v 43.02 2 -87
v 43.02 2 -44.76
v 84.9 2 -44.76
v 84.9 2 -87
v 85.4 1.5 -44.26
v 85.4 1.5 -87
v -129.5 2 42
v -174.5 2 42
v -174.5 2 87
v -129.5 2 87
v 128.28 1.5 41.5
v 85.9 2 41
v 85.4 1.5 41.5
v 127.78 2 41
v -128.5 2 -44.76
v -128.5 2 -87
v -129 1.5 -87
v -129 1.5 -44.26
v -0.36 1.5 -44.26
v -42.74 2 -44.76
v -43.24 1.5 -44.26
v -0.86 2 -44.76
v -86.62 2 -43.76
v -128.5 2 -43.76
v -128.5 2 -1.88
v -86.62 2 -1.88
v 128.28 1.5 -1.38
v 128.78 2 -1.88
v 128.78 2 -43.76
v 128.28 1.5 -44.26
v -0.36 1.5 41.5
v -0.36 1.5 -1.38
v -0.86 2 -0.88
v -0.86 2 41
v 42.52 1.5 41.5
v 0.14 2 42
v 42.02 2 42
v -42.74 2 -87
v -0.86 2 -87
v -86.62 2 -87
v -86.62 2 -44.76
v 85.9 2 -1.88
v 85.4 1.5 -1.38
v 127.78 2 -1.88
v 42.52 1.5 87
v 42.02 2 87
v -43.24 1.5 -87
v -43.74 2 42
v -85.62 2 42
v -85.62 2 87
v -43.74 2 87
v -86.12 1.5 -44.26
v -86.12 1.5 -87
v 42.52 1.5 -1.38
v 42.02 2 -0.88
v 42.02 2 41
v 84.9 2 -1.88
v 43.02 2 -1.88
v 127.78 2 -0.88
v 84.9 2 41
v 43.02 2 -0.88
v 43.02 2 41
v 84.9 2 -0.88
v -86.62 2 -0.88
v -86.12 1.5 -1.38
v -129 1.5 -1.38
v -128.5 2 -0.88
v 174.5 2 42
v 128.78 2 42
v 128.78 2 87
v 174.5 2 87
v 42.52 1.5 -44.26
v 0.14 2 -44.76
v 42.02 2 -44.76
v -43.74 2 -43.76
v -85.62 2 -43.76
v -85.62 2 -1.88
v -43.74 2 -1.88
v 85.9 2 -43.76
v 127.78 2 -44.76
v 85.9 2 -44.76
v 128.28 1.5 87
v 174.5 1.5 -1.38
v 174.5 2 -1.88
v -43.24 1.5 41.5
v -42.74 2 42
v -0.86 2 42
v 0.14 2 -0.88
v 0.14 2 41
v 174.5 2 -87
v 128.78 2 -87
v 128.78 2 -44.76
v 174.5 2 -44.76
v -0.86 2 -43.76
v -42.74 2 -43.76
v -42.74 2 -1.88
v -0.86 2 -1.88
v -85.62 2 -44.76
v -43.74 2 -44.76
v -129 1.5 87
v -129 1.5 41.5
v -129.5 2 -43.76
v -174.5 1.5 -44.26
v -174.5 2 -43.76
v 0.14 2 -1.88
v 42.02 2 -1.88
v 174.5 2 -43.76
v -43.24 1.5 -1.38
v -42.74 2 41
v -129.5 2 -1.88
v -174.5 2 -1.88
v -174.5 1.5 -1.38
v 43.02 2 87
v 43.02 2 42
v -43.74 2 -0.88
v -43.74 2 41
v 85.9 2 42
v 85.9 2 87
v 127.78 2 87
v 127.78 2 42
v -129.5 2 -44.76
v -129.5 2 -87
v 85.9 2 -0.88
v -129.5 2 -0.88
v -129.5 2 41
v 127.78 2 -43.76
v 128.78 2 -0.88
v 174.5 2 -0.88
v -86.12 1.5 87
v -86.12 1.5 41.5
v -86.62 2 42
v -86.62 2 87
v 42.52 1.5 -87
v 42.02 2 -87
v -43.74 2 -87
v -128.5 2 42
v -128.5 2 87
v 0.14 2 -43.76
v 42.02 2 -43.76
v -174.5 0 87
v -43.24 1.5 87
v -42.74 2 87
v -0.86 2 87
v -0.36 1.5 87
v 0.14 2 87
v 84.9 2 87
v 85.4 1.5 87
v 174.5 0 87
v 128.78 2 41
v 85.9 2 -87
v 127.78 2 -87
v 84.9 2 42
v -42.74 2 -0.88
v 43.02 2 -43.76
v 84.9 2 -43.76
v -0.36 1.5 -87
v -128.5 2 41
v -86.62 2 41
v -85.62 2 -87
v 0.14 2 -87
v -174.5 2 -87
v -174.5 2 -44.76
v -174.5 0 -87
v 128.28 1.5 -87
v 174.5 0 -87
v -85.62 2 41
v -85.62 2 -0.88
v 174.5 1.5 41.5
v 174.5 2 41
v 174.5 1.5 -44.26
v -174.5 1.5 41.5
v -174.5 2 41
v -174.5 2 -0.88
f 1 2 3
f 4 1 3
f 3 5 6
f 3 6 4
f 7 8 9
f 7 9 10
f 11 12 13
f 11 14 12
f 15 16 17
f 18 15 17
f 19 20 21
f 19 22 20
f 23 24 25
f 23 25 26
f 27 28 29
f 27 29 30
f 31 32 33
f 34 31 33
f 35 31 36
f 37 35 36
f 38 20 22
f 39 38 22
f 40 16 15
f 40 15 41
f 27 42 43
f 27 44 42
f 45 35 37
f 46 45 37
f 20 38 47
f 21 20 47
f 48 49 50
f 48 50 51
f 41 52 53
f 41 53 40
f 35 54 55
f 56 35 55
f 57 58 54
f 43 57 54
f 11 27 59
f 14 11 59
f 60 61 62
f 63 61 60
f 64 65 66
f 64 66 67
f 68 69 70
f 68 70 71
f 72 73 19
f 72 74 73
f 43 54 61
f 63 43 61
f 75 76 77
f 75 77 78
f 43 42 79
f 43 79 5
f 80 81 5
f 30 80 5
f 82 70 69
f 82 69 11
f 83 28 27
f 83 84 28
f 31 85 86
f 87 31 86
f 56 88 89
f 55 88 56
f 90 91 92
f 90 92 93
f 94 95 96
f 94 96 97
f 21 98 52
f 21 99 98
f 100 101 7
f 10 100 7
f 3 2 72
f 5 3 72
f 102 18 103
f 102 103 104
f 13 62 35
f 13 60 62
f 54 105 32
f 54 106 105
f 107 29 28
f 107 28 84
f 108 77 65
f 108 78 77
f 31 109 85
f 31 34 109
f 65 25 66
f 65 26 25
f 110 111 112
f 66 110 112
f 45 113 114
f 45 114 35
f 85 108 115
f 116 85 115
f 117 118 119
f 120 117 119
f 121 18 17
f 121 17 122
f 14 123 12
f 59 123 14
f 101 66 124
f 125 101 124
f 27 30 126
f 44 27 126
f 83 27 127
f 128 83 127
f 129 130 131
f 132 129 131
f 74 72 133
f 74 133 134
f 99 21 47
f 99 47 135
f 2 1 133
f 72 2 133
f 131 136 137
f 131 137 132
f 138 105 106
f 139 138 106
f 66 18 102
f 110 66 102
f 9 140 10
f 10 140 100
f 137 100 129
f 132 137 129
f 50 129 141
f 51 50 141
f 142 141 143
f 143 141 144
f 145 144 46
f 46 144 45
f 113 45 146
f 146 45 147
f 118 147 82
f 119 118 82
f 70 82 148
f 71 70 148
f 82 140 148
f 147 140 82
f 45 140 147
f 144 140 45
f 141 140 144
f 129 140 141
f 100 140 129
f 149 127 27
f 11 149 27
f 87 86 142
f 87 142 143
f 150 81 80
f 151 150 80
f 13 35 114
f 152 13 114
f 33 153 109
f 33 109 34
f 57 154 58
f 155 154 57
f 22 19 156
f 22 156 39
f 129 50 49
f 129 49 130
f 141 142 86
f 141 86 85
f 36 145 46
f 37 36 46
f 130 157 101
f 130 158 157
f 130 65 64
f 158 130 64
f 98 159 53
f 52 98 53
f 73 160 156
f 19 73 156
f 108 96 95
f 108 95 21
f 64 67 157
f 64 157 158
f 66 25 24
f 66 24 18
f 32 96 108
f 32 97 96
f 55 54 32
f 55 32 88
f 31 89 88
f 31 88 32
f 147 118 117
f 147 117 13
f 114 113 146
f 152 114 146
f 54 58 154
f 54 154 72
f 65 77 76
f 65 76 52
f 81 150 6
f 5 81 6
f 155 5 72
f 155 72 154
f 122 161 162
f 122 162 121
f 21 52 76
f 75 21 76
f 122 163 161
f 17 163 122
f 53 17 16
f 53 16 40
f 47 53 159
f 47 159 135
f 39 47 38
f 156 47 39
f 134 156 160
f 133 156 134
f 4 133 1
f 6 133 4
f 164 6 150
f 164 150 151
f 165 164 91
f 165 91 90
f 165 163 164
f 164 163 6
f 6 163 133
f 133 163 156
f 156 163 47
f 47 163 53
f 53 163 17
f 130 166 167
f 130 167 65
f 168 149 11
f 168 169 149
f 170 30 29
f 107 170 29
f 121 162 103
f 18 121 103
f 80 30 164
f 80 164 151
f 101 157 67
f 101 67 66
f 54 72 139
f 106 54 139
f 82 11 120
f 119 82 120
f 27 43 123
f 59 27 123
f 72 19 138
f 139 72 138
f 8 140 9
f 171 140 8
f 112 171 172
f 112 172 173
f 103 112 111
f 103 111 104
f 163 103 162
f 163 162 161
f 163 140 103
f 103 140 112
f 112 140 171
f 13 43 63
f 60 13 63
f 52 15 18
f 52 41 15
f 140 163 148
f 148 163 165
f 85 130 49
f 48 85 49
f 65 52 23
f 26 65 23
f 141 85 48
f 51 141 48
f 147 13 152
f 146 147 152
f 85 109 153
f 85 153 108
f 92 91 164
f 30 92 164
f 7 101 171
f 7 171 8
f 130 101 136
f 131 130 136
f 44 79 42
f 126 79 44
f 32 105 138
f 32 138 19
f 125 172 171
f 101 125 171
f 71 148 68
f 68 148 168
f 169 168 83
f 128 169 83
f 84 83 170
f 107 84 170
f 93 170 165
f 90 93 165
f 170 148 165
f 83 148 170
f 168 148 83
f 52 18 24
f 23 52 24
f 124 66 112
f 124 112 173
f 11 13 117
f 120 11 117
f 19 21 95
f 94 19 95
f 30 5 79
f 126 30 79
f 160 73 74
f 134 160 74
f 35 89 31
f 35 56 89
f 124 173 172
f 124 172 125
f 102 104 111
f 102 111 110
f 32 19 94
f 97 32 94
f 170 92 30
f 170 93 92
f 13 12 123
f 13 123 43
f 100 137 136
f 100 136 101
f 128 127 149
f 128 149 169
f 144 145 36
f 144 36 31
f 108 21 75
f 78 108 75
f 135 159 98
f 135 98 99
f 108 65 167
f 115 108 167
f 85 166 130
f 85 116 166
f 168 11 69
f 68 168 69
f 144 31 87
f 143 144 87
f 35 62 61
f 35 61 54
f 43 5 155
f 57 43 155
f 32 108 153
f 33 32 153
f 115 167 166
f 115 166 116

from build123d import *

# Parameters (mm, degrees)
SKETCH1_W           = 349
SKETCH1_H           = 174
BOSS_EXTRUDE1_DEPTH = 2
CUT_EXTRUDE1_DEPTH  = 245.326114036
LPATTERN1_COUNT     = 7
LPATTERN1_PITCH     = 42.88
CUT_EXTRUDE2_DEPTH  = 357.412177998
LPATTERN2_COUNT     = 3
LPATTERN2_PITCH     = 42.88


with BuildPart() as part:
    # Sketch1 → Boss-Extrude1 (new body)
    with BuildSketch(Plane(origin=(0, 0, 0), x_dir=(1, 0, 0), z_dir=(0, 1, 0))):
        Rectangle(SKETCH1_W, SKETCH1_H)
    extrude(amount=BOSS_EXTRUDE1_DEPTH)

    # Sketch3 → Cut-Extrude1 (cut, symmetric)
    with BuildSketch(Plane.XY.offset(84)):
        Polygon((-129.5, 2), (-128.5, 2), (-129, 1.5), align=None)
    cut_extrude1 = extrude(amount=CUT_EXTRUDE1_DEPTH, both=True, mode=Mode.SUBTRACT)

    # LPattern1: Cut-Extrude1 ×7
    with Locations(*[(i * LPATTERN1_PITCH, 0, 0) for i in range(1, LPATTERN1_COUNT)]):
        add(cut_extrude1, mode=Mode.SUBTRACT)

    # Sketch4 → Cut-Extrude2 (cut, symmetric)
    with BuildSketch(Plane(origin=(171.125, 0, 0), x_dir=(0, 0, -1), z_dir=(1, 0, 0))):
        Polygon((-41.5, 2), (-41, 2), (-41.5, 1.5), (-42, 2), align=None)
    cut_extrude2 = extrude(amount=CUT_EXTRUDE2_DEPTH, both=True, mode=Mode.SUBTRACT)

    # LPattern2: Cut-Extrude2 ×3
    with Locations(*[(0, 0, -i * LPATTERN2_PITCH) for i in range(1, LPATTERN2_COUNT)]):
        add(cut_extrude2, mode=Mode.SUBTRACT)


solid = part.part
